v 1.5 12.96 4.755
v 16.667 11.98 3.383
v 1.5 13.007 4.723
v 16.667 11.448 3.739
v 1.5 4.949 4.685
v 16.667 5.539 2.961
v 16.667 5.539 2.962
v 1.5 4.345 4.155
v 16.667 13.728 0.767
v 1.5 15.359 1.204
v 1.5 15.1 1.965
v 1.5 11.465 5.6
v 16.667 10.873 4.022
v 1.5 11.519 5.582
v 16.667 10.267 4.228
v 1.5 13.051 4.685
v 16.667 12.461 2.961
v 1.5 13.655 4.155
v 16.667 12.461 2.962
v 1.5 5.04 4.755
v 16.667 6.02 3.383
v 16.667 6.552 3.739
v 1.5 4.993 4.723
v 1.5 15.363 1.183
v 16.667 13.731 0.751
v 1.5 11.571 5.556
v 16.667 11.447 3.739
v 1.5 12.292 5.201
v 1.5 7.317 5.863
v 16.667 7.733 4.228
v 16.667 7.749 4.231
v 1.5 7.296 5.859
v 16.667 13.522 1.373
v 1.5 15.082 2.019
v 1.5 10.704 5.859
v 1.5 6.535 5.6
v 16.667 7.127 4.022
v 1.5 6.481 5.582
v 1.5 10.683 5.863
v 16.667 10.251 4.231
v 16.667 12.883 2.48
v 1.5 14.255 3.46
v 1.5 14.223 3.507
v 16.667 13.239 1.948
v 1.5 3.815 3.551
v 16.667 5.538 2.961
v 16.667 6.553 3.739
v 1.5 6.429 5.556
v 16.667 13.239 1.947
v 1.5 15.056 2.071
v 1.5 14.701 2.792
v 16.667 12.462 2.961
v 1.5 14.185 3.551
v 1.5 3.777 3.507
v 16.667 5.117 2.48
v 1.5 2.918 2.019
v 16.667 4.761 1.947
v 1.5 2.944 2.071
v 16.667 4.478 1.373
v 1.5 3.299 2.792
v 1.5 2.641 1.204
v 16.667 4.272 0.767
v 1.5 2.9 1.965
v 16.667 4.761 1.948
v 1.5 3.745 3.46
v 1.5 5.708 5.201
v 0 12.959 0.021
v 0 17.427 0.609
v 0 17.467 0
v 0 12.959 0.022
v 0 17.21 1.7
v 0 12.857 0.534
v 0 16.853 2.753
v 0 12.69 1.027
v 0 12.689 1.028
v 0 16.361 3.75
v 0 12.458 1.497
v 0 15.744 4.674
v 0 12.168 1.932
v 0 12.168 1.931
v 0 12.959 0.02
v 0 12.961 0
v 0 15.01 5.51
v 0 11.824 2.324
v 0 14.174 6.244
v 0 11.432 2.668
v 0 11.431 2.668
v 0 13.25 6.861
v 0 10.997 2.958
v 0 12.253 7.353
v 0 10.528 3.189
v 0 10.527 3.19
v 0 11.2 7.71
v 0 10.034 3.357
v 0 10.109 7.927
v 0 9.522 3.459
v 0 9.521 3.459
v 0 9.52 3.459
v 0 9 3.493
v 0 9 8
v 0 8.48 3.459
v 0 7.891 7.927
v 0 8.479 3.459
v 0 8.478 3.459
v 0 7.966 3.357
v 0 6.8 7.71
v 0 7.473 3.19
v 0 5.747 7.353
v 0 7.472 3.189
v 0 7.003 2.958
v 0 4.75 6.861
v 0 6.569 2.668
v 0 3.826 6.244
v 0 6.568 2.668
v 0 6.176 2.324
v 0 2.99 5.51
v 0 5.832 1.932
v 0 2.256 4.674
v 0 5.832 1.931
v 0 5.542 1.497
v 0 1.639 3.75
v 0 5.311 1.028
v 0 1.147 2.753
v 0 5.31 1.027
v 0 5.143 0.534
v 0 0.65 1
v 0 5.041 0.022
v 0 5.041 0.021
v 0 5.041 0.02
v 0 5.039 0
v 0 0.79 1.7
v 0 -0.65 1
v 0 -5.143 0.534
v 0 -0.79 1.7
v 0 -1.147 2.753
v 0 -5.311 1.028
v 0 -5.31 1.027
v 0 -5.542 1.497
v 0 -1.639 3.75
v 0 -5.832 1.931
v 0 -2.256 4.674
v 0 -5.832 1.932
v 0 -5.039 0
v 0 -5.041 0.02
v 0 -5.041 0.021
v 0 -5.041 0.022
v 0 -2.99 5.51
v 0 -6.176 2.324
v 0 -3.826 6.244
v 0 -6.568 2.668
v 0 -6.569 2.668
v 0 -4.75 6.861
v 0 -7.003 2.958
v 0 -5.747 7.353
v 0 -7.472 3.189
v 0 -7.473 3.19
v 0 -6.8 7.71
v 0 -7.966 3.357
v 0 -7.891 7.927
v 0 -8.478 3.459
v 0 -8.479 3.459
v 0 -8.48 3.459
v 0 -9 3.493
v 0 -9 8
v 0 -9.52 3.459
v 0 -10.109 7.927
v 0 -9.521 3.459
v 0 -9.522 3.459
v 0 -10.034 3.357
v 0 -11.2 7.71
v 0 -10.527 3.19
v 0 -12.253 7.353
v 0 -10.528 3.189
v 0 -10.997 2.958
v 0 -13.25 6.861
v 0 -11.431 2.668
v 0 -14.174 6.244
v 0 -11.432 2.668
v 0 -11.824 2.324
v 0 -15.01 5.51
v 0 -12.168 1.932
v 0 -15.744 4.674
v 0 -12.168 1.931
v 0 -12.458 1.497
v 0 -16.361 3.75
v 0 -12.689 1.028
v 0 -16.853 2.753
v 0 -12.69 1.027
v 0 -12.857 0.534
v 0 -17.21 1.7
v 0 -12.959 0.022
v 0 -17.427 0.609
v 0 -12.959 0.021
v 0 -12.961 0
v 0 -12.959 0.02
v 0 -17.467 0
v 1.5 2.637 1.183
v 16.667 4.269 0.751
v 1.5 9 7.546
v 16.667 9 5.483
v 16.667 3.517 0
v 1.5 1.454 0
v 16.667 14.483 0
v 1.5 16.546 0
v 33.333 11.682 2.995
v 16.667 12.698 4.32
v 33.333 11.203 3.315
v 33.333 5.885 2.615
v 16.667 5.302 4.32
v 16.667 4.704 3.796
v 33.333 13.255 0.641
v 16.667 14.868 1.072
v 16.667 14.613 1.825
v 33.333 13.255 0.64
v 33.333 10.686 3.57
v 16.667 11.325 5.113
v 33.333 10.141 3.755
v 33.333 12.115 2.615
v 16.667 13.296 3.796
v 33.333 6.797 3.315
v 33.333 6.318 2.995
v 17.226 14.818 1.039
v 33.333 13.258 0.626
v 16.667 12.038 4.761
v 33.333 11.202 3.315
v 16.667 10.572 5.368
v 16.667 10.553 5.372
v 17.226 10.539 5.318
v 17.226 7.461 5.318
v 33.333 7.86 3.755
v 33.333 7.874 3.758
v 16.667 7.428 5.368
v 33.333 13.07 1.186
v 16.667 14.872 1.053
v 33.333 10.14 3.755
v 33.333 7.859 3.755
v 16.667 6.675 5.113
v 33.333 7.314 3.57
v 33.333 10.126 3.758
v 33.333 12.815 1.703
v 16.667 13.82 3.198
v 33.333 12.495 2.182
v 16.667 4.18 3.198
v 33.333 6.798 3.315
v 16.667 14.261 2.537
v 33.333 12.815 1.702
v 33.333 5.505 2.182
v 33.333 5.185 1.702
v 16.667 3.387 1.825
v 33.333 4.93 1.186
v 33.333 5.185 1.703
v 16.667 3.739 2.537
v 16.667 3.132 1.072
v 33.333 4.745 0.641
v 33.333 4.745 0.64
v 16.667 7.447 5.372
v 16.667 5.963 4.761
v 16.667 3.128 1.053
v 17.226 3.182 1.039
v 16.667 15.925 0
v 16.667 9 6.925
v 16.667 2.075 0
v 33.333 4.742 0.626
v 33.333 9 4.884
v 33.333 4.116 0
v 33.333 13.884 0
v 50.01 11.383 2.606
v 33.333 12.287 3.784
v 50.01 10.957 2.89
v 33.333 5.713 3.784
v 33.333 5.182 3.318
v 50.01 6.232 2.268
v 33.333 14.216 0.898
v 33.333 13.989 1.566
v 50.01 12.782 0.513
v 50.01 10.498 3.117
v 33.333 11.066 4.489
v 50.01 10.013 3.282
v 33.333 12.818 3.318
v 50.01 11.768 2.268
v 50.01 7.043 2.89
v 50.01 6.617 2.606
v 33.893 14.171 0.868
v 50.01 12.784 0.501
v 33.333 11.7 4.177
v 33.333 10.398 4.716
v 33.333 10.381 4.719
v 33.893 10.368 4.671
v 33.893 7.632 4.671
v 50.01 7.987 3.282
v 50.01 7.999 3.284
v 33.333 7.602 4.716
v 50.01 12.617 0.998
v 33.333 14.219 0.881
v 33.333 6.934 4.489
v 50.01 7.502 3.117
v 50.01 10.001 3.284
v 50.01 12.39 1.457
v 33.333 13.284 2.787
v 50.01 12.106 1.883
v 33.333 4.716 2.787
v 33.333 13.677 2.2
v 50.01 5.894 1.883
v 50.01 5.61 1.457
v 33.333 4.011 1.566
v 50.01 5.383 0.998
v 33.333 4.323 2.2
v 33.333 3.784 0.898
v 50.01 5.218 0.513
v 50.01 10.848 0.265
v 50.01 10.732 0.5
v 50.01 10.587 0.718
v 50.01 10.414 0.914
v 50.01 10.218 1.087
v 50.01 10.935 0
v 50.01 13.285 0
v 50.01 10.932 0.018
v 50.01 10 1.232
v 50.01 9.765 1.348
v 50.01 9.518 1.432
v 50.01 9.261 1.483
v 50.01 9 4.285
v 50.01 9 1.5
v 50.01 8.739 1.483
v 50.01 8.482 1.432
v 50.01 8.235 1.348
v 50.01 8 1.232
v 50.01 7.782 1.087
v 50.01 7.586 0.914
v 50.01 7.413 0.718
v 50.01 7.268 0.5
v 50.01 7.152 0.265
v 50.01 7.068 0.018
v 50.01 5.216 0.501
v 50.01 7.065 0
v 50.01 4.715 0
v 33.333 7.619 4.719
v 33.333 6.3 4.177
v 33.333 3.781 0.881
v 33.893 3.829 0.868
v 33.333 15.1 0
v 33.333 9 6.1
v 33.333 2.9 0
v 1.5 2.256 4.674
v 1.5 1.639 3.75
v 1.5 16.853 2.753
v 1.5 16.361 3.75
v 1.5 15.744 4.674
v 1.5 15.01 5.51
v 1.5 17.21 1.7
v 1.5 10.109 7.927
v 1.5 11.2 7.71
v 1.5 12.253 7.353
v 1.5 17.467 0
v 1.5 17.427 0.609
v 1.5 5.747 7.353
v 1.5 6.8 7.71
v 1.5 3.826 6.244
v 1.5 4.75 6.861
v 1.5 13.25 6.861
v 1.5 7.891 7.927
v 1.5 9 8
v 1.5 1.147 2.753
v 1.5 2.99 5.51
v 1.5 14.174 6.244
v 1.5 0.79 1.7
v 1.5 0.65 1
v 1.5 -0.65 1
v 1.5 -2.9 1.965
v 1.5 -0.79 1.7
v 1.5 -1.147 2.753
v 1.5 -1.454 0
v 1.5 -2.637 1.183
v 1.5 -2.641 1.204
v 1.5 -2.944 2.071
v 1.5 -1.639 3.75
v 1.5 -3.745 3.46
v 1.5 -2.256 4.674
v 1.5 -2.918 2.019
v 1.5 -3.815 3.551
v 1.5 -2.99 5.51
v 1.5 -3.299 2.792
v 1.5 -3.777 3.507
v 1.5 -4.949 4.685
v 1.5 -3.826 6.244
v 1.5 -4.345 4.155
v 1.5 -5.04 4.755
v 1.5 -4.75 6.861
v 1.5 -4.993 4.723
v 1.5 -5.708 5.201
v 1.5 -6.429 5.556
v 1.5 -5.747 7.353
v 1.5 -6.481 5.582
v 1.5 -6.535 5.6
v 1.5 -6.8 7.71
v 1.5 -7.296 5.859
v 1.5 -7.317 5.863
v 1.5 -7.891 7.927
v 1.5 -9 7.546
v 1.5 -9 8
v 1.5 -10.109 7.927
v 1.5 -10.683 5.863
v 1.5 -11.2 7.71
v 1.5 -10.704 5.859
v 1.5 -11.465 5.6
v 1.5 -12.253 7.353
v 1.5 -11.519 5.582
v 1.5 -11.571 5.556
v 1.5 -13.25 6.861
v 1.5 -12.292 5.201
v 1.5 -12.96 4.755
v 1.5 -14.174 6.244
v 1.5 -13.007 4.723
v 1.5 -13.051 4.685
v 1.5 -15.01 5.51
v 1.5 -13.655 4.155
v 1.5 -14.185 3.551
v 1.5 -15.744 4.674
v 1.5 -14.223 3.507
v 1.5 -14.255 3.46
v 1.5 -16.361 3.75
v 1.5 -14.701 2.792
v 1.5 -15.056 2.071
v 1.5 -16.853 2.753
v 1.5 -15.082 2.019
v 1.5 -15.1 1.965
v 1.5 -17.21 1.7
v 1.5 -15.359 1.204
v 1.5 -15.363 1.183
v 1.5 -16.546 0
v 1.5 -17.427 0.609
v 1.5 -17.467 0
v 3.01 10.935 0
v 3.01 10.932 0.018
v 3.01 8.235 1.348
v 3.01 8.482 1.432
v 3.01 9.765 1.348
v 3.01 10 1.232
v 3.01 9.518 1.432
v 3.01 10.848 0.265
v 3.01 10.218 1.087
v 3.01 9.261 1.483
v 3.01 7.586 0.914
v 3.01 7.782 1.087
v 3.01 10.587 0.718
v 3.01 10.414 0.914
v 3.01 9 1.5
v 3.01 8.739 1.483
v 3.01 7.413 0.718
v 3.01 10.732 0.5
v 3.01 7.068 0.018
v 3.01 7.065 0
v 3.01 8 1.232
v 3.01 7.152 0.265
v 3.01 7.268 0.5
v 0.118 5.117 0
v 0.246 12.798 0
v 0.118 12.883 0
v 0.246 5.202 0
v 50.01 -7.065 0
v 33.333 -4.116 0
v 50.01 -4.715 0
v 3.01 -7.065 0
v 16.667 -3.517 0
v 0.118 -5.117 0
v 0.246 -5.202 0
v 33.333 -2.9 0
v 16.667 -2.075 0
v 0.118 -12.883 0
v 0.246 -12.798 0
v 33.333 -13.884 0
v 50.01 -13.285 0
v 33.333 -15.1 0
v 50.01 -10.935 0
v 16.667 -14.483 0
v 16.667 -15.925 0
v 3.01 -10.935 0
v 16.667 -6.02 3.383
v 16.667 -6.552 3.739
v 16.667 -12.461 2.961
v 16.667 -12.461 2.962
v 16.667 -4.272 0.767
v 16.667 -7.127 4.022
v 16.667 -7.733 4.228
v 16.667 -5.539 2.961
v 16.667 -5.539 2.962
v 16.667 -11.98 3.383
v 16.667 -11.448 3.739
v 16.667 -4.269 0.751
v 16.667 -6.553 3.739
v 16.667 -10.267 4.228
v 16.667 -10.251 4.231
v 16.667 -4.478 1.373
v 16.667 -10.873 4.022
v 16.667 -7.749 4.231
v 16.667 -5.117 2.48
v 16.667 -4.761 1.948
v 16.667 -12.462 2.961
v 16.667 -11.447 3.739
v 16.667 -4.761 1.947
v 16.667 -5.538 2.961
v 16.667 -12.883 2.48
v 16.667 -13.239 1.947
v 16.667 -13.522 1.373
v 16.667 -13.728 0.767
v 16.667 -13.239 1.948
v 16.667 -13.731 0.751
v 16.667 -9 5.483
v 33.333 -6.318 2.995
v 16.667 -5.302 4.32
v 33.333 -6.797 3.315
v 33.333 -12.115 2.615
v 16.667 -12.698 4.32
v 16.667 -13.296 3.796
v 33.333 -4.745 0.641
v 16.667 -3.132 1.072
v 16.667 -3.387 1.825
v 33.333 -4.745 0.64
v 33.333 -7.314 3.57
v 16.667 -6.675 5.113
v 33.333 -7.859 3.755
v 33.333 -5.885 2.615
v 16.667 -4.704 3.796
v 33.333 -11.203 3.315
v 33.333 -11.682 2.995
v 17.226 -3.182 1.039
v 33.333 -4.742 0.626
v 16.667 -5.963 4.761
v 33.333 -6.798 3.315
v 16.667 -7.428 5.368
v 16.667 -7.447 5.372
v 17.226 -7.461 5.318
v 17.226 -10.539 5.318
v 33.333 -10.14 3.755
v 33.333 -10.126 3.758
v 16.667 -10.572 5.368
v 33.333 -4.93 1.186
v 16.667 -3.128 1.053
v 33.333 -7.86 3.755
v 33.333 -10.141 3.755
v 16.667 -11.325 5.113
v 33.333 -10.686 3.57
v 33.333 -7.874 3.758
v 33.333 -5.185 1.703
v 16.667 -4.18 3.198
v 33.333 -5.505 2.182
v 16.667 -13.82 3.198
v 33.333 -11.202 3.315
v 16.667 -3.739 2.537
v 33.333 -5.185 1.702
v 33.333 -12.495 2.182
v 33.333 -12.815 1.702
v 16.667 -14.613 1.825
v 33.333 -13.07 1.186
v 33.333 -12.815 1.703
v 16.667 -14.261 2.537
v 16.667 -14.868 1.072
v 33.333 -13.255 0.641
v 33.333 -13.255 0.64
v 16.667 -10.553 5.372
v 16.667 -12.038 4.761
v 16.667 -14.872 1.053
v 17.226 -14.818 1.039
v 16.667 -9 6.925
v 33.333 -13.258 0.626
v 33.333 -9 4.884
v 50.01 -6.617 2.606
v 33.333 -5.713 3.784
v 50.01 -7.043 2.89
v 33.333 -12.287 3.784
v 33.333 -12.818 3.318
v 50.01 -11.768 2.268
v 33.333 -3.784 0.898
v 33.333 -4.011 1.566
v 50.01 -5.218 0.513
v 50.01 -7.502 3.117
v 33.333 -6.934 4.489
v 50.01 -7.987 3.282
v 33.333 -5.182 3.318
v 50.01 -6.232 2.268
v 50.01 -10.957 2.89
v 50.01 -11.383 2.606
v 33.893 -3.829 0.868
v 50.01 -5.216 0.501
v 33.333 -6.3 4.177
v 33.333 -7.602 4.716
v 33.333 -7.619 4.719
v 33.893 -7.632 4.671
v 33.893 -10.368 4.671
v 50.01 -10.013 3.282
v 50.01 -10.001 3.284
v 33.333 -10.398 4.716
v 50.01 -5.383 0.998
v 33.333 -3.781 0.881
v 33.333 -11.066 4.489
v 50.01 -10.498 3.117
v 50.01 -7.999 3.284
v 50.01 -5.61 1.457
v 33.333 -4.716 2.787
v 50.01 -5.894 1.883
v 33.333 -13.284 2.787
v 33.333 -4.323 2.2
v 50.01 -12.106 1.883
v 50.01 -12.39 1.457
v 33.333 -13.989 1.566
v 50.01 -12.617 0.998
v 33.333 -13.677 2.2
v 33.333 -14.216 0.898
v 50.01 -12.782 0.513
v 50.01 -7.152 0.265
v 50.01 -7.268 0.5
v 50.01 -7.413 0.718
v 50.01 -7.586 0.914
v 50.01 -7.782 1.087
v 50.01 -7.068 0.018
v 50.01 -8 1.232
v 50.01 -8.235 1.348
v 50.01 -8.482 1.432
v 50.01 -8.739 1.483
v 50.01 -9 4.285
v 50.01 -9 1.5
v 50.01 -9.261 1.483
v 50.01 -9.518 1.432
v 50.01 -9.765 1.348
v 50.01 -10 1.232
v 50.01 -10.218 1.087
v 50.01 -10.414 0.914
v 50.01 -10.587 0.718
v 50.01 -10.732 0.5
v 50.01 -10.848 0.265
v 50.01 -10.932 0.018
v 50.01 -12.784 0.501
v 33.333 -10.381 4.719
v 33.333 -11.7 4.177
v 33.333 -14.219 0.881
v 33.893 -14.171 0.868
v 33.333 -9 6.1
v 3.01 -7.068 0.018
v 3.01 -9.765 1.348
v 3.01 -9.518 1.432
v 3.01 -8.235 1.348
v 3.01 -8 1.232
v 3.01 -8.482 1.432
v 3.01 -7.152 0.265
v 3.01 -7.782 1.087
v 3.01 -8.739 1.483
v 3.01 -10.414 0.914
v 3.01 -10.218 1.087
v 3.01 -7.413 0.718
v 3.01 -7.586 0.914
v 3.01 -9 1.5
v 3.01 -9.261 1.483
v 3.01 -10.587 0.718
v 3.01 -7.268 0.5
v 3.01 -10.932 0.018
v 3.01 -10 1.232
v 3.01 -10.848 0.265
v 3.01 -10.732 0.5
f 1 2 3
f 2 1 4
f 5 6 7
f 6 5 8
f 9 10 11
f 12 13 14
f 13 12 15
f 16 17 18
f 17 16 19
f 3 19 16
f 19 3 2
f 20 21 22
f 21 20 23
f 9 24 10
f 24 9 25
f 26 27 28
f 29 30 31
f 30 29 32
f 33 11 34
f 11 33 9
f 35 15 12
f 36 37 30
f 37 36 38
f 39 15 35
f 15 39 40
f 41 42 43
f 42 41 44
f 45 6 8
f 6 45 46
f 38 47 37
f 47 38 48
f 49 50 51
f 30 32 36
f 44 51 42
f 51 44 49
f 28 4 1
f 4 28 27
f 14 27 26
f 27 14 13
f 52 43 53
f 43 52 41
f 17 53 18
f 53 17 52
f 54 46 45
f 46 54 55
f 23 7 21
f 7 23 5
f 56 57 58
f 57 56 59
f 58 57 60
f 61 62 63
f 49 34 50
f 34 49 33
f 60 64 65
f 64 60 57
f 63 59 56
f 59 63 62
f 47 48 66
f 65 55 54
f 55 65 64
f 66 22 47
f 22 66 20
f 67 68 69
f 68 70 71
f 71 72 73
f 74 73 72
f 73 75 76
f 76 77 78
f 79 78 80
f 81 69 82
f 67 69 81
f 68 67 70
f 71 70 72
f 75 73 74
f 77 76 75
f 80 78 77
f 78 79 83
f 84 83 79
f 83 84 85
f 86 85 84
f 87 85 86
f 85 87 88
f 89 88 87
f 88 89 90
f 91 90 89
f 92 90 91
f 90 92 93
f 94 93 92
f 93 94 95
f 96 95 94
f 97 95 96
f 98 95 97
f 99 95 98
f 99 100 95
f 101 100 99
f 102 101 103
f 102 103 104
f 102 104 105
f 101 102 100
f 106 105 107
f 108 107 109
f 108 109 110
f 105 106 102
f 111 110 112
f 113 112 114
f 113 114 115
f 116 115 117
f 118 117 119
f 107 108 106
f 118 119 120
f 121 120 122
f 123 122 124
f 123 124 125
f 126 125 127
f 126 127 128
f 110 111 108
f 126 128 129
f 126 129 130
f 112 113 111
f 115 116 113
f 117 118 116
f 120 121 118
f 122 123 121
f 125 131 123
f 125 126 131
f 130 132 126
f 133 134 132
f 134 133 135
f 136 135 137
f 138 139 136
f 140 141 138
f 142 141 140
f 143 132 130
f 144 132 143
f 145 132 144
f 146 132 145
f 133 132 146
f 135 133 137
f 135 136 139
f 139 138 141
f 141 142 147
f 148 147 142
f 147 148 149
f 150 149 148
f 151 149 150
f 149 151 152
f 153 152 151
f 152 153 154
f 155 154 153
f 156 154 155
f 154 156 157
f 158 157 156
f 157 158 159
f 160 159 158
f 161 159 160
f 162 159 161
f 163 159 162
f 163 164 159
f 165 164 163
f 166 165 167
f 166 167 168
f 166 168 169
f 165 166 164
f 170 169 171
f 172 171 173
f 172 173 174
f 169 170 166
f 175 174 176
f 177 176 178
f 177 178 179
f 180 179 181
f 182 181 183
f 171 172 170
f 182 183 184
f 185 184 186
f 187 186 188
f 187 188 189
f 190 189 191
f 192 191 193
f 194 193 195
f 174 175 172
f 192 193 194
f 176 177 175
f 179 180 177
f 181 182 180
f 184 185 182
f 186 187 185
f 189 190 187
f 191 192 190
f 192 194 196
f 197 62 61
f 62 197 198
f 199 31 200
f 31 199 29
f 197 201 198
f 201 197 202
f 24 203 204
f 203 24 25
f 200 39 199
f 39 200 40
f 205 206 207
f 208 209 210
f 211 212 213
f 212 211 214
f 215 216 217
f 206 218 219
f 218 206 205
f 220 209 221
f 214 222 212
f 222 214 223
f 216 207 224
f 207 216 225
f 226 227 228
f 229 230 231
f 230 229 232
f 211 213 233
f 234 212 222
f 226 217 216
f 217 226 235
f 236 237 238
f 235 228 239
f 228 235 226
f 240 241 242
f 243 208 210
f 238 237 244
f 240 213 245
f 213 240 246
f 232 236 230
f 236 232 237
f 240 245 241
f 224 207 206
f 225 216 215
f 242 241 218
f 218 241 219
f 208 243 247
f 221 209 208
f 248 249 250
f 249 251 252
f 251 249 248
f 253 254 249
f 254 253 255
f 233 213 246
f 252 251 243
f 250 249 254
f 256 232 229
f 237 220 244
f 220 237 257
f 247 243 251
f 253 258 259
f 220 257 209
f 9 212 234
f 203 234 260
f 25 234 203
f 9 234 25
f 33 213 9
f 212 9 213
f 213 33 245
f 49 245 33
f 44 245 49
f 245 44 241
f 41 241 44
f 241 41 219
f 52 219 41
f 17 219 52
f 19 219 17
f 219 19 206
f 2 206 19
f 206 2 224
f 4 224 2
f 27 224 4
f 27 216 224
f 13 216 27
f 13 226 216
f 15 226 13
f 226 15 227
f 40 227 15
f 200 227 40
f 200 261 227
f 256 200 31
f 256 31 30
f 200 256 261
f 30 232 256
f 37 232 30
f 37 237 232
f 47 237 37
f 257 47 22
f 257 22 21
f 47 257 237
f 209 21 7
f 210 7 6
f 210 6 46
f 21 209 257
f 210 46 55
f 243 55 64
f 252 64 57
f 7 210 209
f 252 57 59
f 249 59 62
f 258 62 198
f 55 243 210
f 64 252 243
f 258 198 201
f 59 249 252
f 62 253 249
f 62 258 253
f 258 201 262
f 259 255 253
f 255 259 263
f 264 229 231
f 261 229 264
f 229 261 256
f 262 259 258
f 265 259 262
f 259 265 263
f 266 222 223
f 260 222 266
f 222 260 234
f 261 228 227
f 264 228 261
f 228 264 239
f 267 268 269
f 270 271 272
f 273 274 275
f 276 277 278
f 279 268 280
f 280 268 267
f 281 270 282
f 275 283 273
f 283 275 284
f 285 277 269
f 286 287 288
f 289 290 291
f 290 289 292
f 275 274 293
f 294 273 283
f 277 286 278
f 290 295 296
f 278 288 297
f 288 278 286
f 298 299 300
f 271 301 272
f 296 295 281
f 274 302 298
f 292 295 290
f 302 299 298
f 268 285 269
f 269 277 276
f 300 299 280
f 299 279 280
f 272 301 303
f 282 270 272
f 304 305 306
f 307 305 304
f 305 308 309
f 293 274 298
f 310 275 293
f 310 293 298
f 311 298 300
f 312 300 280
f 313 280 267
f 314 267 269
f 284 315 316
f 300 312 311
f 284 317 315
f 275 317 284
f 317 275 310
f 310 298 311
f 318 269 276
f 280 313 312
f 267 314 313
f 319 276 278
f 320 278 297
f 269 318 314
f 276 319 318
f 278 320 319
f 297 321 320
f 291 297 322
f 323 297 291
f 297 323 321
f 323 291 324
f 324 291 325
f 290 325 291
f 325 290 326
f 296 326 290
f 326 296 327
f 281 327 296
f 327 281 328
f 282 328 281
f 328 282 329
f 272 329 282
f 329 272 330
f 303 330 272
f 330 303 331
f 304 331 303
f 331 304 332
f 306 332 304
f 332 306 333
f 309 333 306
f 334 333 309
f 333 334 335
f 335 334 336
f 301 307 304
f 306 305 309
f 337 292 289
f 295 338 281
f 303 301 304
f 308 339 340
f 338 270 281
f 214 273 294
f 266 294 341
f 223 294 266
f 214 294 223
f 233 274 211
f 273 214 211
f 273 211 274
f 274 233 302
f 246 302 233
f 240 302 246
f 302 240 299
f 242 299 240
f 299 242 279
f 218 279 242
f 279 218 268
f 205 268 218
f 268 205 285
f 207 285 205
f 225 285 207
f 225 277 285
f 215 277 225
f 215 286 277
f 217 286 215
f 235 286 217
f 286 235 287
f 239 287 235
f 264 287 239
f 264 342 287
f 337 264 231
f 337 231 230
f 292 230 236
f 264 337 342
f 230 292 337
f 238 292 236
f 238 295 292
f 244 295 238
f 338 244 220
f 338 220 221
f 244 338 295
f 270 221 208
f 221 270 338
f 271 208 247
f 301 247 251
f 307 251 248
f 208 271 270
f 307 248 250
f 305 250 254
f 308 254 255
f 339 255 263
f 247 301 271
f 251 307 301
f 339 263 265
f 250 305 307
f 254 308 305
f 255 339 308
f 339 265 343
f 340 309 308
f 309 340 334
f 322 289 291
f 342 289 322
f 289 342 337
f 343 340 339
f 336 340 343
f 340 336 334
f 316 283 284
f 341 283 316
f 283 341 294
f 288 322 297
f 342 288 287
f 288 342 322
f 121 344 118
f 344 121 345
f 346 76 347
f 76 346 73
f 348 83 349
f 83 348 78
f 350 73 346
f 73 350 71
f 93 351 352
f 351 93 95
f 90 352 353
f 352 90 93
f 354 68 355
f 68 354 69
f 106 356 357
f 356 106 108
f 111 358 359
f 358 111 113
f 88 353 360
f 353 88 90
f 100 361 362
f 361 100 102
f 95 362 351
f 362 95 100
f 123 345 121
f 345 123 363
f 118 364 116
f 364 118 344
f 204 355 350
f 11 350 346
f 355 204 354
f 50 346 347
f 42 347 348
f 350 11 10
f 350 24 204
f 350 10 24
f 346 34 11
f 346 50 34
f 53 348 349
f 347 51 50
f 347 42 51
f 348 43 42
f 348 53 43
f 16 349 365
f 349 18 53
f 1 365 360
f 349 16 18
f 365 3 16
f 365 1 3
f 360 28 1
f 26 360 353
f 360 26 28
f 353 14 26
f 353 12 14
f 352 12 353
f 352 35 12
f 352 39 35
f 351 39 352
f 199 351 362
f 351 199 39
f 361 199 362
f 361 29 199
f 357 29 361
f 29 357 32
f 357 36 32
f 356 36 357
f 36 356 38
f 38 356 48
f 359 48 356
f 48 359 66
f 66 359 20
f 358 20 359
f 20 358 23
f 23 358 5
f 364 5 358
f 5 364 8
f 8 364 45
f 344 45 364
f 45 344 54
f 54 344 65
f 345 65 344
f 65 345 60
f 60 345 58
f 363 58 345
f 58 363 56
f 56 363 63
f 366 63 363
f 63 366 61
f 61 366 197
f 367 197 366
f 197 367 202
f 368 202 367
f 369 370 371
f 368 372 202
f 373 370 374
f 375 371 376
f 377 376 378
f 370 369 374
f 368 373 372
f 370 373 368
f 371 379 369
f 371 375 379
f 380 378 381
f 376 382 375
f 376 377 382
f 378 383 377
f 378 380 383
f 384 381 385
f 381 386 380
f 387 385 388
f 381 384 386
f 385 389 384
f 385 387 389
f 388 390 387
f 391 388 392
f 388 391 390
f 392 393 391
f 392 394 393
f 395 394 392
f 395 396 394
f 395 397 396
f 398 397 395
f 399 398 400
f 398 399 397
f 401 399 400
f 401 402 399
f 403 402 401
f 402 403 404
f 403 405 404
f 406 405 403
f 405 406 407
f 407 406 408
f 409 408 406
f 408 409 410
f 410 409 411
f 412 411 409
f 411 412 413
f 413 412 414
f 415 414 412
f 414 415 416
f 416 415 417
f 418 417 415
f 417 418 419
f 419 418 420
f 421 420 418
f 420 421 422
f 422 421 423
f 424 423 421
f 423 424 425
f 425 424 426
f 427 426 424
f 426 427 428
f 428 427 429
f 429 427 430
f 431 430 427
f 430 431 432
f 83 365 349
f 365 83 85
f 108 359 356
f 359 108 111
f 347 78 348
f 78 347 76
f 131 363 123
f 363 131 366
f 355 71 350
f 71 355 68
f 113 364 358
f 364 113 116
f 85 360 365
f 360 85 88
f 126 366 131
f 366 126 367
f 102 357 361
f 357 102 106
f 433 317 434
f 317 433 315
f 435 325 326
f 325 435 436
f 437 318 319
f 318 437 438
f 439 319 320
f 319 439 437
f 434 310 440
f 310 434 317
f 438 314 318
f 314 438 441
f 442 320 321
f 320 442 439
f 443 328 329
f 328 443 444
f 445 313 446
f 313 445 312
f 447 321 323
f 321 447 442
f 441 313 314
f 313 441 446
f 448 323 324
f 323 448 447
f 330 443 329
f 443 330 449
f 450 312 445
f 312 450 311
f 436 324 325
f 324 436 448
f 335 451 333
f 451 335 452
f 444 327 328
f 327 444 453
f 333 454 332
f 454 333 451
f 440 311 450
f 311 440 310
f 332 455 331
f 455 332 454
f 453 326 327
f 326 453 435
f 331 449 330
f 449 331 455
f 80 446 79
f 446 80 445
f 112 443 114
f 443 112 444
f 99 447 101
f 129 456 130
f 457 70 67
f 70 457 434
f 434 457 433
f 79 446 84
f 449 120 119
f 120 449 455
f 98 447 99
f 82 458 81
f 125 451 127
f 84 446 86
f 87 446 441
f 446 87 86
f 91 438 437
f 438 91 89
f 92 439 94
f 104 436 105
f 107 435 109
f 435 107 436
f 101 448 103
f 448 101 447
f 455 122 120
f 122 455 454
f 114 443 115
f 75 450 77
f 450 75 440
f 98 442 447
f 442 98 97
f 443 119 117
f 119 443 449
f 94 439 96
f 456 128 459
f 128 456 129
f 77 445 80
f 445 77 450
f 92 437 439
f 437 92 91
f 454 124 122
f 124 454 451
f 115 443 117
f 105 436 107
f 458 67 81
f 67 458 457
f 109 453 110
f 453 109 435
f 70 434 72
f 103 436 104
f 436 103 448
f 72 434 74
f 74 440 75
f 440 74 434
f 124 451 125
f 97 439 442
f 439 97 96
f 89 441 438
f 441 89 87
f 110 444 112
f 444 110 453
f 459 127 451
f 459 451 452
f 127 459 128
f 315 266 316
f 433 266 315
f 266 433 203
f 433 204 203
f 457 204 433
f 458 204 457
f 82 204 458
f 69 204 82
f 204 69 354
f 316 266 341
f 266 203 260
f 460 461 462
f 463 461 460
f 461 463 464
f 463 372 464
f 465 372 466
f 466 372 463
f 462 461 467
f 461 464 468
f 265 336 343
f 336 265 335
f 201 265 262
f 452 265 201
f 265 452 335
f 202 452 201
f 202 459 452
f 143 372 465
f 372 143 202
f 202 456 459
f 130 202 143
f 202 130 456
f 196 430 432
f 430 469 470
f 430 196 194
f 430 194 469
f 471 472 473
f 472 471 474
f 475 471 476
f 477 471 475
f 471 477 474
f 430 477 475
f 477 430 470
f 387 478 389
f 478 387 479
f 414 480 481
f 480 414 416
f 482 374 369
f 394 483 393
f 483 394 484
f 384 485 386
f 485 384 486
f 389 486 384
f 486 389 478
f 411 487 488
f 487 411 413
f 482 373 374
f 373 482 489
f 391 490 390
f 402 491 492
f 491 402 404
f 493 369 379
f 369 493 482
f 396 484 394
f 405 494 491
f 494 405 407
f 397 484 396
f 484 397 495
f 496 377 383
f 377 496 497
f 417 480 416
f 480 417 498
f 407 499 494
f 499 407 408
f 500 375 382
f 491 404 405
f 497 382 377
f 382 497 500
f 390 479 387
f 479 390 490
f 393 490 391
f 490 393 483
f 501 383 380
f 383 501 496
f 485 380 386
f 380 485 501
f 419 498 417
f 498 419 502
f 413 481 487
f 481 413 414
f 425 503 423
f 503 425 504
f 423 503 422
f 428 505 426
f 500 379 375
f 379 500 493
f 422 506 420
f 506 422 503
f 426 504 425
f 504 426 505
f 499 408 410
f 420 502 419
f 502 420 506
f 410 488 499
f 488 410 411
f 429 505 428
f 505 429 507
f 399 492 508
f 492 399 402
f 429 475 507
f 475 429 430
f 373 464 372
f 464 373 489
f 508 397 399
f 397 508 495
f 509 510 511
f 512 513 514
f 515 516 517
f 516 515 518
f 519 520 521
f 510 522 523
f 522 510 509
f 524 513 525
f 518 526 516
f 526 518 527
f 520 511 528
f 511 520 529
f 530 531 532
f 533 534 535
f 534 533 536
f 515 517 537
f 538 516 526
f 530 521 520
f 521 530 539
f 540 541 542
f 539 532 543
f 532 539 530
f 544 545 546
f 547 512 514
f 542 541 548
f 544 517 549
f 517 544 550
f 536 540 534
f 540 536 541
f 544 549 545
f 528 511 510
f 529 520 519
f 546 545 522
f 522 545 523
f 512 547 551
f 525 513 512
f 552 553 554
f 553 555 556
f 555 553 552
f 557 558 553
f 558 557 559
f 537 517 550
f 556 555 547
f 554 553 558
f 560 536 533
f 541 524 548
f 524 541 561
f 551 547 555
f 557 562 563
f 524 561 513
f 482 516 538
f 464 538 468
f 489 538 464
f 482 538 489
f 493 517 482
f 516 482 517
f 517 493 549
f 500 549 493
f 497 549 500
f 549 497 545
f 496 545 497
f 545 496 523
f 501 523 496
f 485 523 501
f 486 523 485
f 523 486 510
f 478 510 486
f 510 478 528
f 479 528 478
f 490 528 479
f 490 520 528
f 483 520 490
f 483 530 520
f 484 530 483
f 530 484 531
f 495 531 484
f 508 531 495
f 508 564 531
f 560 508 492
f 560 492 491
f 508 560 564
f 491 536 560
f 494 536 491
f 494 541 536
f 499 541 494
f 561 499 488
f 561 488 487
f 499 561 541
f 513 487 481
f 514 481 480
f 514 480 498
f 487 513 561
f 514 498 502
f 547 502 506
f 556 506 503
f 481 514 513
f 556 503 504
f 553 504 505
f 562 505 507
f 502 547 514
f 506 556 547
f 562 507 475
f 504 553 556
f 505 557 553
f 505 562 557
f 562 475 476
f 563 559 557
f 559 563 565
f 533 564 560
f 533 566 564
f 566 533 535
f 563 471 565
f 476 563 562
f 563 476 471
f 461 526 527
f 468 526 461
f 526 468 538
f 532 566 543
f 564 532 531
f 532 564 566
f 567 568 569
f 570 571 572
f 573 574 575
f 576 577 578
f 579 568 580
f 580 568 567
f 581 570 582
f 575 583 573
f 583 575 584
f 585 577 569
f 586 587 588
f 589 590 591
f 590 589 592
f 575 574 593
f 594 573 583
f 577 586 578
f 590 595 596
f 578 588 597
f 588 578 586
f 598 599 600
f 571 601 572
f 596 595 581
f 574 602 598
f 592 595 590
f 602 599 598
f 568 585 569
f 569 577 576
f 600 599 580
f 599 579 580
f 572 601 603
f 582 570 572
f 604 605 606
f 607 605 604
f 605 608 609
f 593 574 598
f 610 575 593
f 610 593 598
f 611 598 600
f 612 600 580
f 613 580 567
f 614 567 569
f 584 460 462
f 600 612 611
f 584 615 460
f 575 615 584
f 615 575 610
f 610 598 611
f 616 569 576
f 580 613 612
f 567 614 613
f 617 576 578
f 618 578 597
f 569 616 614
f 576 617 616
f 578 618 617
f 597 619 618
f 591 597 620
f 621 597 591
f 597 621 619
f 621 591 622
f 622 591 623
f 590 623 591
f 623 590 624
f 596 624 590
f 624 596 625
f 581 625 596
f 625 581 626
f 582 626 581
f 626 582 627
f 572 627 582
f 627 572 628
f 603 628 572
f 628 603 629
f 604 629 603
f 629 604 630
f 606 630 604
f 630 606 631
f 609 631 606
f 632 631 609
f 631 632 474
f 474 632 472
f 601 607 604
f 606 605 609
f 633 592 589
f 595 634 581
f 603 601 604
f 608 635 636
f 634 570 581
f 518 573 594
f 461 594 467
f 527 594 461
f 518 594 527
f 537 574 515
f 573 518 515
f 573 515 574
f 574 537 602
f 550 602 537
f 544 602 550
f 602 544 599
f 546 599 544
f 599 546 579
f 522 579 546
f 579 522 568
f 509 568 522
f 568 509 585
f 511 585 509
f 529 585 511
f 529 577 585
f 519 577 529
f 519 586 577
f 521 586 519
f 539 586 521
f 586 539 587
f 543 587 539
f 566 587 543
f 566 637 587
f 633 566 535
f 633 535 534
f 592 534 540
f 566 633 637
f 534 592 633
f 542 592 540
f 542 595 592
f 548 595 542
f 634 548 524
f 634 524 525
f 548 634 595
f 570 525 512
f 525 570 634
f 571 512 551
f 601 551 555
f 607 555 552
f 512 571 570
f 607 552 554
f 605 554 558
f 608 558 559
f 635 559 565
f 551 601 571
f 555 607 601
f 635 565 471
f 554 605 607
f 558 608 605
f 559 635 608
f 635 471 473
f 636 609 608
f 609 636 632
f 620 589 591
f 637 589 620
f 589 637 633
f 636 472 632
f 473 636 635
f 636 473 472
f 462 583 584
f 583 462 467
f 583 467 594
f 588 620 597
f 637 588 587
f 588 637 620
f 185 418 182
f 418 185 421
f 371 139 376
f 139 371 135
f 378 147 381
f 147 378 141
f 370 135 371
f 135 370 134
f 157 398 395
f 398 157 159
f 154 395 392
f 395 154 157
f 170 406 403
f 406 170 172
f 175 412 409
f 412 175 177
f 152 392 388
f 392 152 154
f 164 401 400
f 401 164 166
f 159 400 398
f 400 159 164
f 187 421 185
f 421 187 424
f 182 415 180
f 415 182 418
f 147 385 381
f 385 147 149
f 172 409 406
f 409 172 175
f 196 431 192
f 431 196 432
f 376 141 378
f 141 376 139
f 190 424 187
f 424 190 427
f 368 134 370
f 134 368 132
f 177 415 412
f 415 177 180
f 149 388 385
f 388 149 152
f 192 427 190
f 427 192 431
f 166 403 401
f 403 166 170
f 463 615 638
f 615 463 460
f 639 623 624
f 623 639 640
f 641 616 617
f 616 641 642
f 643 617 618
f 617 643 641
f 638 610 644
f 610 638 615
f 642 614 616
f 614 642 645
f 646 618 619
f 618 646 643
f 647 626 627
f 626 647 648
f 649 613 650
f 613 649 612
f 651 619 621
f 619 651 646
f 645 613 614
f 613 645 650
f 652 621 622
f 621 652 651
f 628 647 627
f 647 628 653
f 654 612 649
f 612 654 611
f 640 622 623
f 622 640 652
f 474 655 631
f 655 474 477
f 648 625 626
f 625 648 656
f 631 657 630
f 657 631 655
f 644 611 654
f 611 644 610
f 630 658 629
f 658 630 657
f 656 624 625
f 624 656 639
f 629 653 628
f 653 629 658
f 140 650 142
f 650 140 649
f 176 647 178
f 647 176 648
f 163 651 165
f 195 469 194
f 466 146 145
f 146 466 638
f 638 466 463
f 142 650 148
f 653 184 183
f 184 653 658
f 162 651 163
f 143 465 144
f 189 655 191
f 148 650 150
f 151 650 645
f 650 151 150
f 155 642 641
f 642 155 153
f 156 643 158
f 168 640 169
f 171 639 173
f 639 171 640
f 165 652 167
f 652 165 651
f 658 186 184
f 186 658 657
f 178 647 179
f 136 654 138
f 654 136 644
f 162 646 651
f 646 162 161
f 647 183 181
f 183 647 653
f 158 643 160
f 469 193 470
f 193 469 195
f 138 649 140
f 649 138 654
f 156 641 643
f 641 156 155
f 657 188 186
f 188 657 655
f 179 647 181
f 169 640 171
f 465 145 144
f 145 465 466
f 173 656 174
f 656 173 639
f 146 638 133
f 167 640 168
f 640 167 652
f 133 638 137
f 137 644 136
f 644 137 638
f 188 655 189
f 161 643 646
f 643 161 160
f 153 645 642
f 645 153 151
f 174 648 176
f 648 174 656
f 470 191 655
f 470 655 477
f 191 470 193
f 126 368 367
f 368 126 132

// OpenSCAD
// file: ../../lib/maths.scad
/**
    Clamp `t` between `v_min` and `v_max`.
*/
function clamp(v_min, t, v_max) = max(v_min, min(t, v_max));


/**
    Calculate a normal for a line defined by two points.
*/
function normal(a, b) = let (t = b - a) [-t.y, t.x] / norm(t);


/* ================================= *
 * Calculations of individual points *
 * ================================= */


/**
    Performs linear interpolation between values `v0` and `v1`.

    Parameter `t` determines the weights of `v0` and `v1`.
    Its valid values are in the interval [0, 1].
*/
function lerp(v0, v1, t) = assert(t >= 0 && t <= 1) (1 - t) * v0 + t * v1;

_b2 = function (pts, t) lerp(lerp(pts[0], pts[1], t), lerp(pts[1], pts[2], t), t);

/**
    Calculates a single point for a quadratic Bézier curve.
    It has 3 control points.

    Parameter `t` determines the extent from the start of the curve.
    Its valid values are in the interval [0, 1].
*/
function _bezier2(pts, t) = _b2(pts, t);

_b3 = function (pts, t) lerp(_b2([pts[0], pts[1], pts[2]], t), _b2([pts[1], pts[2], pts[3]], t), t);

/**
    Calculates a single point for a cubic Bézier curve.
    It has 4 control points.

    Parameter `t` determines the extent from the start of the curve.
    Its valid values are in the interval [0, 1].
*/
function _bezier3(pts, t) = _b3(pts, t);

_b3_tangent = function (pts, t) let (ot = 1 - t) 3 * ot * ot * (pts[1] - pts[0]) + 6 * ot * t * (pts[2] - pts[1]) + 3 * t * t * (pts[3] - pts[2]);

/**
    Calculates a single tangent to a 2-dimensional cubic Bézier curve.

    Arguments like for `_bezier3`.
 */
function _bezier3_tangent(pts, t) = _b3_tangent(pts, t);


_b3_acceleration = function (pts, t) 6 * (1 - t) * (pts[2] - 2 * pts[1] + pts[0]) + 6 * t * (pts[3] - 2 * pts[2] + pts[1]);
function _bezier3_acceleration(pts, t) = _b3_acceleration(pts, t);

_b3_normal = function (pts, t) let (tangent = _b3_tangent(pts, t)) [- tangent.y, tangent.x] / norm(tangent);

/**
    Calculates a single normal to a 2-dimensional cubic Bézier curve.
    Has unit length.

    Arguments like for `_bezier3`.
 */
function _bezier3_normal(pts, t) = _b3_normal(pts, t);


/* ============================ *
 * Calculations of point arrays *
 * ============================ */


/**
 *  Generate an array of values of `f(arg, t)` where `t` is from `[0, 1]` subdivided into `steps` steps.
 */
function _step_through(f, arg, steps) = assert(steps > 1, "`steps` should be larger than 1") [ for (t = [0 : 1 / steps : 1]) f(arg, t) ];

/**
    Calculates points for a quadratic Bézier curve.
    It has 3 control points.

    Parameter `steps` determines how many steps the curve is subdivided into.
*/
function bezier2(pts, steps) = _step_through(_b2, pts, steps);

/**
    Calculates points for a cubic Bézier curve.
    It has 4 control points.

    Parameter `steps` determines how many steps the curve is subdivided into.
*/
function bezier3(pts, steps) = _step_through(_b3, pts, steps);

function bezier3_tangents(pts, steps) = _step_through(_b3_tangent, pts, steps);

function bezier3_accelerations(pts, steps) = _step_through(_b3_acceleration, pts, steps);

function bezier3_normals(pts, steps) = _step_through(_b3_normal, pts, steps);


/* ================== *
 * Extended functions *
 * ================== */

function _list_sum(l, i) = l[i] + ((i <= 0) ? 0 : _list_sum(l, i - 1));
function list_sum(l) = _list_sum(l, len(l) - 1);

/**
    Calculates points for a cubic Bezier curve.
    Repositions them in an attempt to provide more equal spacing.
    It has 4 control points.

    Parameter `steps` determines how many steps the curve is subdivided into.
 */
function bezier3_spaced(pts, steps) = let (
        tangents = bezier3_tangents(pts, steps),
        tnorms = [ for (t = tangents) norm(t) ],
        avgtnorm = list_sum(tnorms) / len(tnorms),
        step_old = 1 / steps,
        steps_old = [ for (t = [0 : 1 / steps : 1]) t ],
        adjustments = [ for (i = [0 : steps - 1]) step_old * avgtnorm / tnorms[i]],
        steps_new = [ for (i = [0 : steps - 1]) clamp(0, steps_old[i] + adjustments[i], 1) ]
    ) [for (s = steps_new) _bezier3(pts, s)];


/* ======= *
 * Drawing *
 * ======= */


module stroke_line(p0, p1, thickness) {
    assert(is_list(p0) && len(p0) == 2);
    assert(is_list(p1) && len(p1) == 2);
    assert(is_num(thickness), "thickness must be a number");

    n = normal(p0, p1) * thickness / 2;

    points = [
        p0 + n,
        p1 + n,
        p1 - n,
        p0 - n,
    ];

    polygon(points);
}

module stroke_bezier3(p0, p1, p2, p3, steps, f_thickness) {
    assert(is_list(p0) && len(p0) == 2);
    assert(is_list(p1) && len(p1) == 2);
    assert(is_list(p2) && len(p2) == 2);
    assert(is_list(p3) && len(p3) == 2);
    assert(is_num(steps) && steps > 1, "steps must be a number larger than 1");
    assert(is_function(f_thickness), "f_thickness must be a function");

    pts = [p0, p1, p2, p3];

    points = bezier3(pts, steps);
    normals = bezier3_normals(pts, steps);

    points_outer = [ for (i = [0 : steps]) points[i] + normals[i] * f_thickness(i / steps) / 2 ];
    points_inner = [ for (i = [steps : -1 : 0]) points[i] - normals[i] * f_thickness(i / steps) / 2 ];

    points_polygon = [ for (l = [
        points_outer,
        points_inner,
    ]) each l ];

    polygon(points_polygon);
}
// file: ../../lib/util.scad
function _assert_vec2(vec) =
    assert(is_list(vec) && len(vec) == 2, "a vec is not a list of 2 elements")
    assert(is_num(vec.x) && is_num(vec.y), "a vec component is not a number")
    true;


function _assert_vec3(vec) =
    assert(is_list(vec) && len(vec) == 3, "a vec is not a list of 3 elements")
    assert(is_num(vec.x) && is_num(vec.y) && is_num(vec.z), "a vec component is not a number")
    true;


function _assert_flat(flat) =
    assert(is_list(flat) && len(flat) > 2, "a flat is not a list of more than 2 points")
    is_list([ for (point = flat)
        assert(is_list(point) && len(point) == 2, "a point in a flat is not a list of 2 elements")
        assert(is_num(point.x) && is_num(point.y), "a component of a point in a flat is not a number")
        true
    ]);


function _assert_slice(slice) =
    assert(is_list(slice) && len(slice) > 2, "a slice is not a list of more than 2 points")
    is_list([ for (point = slice)
        assert(is_list(point) && len(point) == 3, "a point in a slice is not a list of 3 elements")
        assert(is_num(point.x) && is_num(point.y) && is_num(point.z), "a component of a point in a slice is not a number")
        true
    ]);


module _halfplane(axis, dir, INF) {
    assert(is_string(axis) && len(axis) == 1 && len(search(axis, "xy")) == 1);
    assert(is_string(dir) && len(dir) == 1 && len(search(dir, "+-")) == 1);

    module hp0() {
        translate([INF / 2, 0])
            square(INF, center = true);
    }

    module hp1() {
        if (dir == "+") {
            hp0();
        } else {
            rotate(180)
                hp0();
        }
    }

    if (axis == "x") {
        hp1();
    } else {
        rotate(90)
            hp1();
    }
}


module half2(which = "x+", INF = 10 ^ 3) {
    intersection() {
        _halfplane(which[0], which[1], INF);

        children();
    }
}


module _halfspace(axis, dir, INF) {
    assert(is_string(axis) && len(axis) == 1 && len(search(axis, "xyz")) == 1);
    assert(is_string(dir) && len(dir) == 1 && len(search(dir, "+-")) == 1);

    module hp0() {
        translate([0, 0, INF / 2])
            cube(INF, center = true);
    }

    module hp1() {
        if (dir == "+") {
            hp0();
        } else {
            mirror([0, 0, 1])
                hp0();
        }
    }

    if (axis == "z") {
        hp1();
    } else if (axis == "y") {
        rotate([-90, 0, 0])
            hp1();
    } else {
        rotate([0, 90, 0])
            hp1();
    }
}


module half3(which = "z+", INF = 10 ^ 3) {
    intersection() {
        _halfspace(which[0], which[1], INF);

        children();
    }
}
// main file
use <../../lib/util.scad>
use <../../lib/maths.scad>


length = 50;

diameter_hole = 15; // [13, 15]
diameter_screw = 4;
diameter_cap = diameter_hole + 2;

section_count = 3;
section_length = length / section_count;
section_scale = 0.7;

cap_height = 1.5;


module __hidden__() {}


half_gap = 1;

r0 = diameter_screw / 2;
r1 = diameter_hole / 2;
r2 = lerp(diameter_screw, diameter_hole, 5/8) / 2;

E = 0.01;
$fn = 48;


module section() {
    module profile() {
        polygon([
            [0, 0],
            [0, section_length + E],
            [r2, section_length + E],
            [r1, 0],
        ]);
    }

    rotate_extrude()
    scale([0.9, 1])
    profile();

    rotate_extrude($fn = 4)
    scale([1.1, 1])
    profile();

    // rotate([0, 0, 45])
    // rotate_extrude($fn = 4)
    // profile();
}


module plug() {
    rotate([0, 90, 0])
    difference() {
        union() {
            for (sec = [0 : section_count - 1]) {
                s = lerp(1, section_scale, sec / section_count);

                translate([0, 0, sec * section_length])
                scale([s, s, 1])
                section();
            }

            cylinder(cap_height, r = diameter_cap / 2);
        }

        cylinder(length + E * 2, r = r0);

        translate([0, 0, -E])
        cylinder(cap_height * 2 + E * 2, r1 = r0 * 2, r2 = r0);
    }
}


module plug_export() {
    translate([0, 0, - diameter_cap])
    %plug();

    half3()
    translate([0, diameter_cap / 2 + 1/2, - half_gap / 2])
    plug();

    half3()
    translate([0, - diameter_cap / 2 - 1/2, - half_gap / 2])
    plug();

    translate([cap_height / 2, 0, 1/2])
    cube([cap_height, 2 + E, 1], center = true);
}


plug_export();
